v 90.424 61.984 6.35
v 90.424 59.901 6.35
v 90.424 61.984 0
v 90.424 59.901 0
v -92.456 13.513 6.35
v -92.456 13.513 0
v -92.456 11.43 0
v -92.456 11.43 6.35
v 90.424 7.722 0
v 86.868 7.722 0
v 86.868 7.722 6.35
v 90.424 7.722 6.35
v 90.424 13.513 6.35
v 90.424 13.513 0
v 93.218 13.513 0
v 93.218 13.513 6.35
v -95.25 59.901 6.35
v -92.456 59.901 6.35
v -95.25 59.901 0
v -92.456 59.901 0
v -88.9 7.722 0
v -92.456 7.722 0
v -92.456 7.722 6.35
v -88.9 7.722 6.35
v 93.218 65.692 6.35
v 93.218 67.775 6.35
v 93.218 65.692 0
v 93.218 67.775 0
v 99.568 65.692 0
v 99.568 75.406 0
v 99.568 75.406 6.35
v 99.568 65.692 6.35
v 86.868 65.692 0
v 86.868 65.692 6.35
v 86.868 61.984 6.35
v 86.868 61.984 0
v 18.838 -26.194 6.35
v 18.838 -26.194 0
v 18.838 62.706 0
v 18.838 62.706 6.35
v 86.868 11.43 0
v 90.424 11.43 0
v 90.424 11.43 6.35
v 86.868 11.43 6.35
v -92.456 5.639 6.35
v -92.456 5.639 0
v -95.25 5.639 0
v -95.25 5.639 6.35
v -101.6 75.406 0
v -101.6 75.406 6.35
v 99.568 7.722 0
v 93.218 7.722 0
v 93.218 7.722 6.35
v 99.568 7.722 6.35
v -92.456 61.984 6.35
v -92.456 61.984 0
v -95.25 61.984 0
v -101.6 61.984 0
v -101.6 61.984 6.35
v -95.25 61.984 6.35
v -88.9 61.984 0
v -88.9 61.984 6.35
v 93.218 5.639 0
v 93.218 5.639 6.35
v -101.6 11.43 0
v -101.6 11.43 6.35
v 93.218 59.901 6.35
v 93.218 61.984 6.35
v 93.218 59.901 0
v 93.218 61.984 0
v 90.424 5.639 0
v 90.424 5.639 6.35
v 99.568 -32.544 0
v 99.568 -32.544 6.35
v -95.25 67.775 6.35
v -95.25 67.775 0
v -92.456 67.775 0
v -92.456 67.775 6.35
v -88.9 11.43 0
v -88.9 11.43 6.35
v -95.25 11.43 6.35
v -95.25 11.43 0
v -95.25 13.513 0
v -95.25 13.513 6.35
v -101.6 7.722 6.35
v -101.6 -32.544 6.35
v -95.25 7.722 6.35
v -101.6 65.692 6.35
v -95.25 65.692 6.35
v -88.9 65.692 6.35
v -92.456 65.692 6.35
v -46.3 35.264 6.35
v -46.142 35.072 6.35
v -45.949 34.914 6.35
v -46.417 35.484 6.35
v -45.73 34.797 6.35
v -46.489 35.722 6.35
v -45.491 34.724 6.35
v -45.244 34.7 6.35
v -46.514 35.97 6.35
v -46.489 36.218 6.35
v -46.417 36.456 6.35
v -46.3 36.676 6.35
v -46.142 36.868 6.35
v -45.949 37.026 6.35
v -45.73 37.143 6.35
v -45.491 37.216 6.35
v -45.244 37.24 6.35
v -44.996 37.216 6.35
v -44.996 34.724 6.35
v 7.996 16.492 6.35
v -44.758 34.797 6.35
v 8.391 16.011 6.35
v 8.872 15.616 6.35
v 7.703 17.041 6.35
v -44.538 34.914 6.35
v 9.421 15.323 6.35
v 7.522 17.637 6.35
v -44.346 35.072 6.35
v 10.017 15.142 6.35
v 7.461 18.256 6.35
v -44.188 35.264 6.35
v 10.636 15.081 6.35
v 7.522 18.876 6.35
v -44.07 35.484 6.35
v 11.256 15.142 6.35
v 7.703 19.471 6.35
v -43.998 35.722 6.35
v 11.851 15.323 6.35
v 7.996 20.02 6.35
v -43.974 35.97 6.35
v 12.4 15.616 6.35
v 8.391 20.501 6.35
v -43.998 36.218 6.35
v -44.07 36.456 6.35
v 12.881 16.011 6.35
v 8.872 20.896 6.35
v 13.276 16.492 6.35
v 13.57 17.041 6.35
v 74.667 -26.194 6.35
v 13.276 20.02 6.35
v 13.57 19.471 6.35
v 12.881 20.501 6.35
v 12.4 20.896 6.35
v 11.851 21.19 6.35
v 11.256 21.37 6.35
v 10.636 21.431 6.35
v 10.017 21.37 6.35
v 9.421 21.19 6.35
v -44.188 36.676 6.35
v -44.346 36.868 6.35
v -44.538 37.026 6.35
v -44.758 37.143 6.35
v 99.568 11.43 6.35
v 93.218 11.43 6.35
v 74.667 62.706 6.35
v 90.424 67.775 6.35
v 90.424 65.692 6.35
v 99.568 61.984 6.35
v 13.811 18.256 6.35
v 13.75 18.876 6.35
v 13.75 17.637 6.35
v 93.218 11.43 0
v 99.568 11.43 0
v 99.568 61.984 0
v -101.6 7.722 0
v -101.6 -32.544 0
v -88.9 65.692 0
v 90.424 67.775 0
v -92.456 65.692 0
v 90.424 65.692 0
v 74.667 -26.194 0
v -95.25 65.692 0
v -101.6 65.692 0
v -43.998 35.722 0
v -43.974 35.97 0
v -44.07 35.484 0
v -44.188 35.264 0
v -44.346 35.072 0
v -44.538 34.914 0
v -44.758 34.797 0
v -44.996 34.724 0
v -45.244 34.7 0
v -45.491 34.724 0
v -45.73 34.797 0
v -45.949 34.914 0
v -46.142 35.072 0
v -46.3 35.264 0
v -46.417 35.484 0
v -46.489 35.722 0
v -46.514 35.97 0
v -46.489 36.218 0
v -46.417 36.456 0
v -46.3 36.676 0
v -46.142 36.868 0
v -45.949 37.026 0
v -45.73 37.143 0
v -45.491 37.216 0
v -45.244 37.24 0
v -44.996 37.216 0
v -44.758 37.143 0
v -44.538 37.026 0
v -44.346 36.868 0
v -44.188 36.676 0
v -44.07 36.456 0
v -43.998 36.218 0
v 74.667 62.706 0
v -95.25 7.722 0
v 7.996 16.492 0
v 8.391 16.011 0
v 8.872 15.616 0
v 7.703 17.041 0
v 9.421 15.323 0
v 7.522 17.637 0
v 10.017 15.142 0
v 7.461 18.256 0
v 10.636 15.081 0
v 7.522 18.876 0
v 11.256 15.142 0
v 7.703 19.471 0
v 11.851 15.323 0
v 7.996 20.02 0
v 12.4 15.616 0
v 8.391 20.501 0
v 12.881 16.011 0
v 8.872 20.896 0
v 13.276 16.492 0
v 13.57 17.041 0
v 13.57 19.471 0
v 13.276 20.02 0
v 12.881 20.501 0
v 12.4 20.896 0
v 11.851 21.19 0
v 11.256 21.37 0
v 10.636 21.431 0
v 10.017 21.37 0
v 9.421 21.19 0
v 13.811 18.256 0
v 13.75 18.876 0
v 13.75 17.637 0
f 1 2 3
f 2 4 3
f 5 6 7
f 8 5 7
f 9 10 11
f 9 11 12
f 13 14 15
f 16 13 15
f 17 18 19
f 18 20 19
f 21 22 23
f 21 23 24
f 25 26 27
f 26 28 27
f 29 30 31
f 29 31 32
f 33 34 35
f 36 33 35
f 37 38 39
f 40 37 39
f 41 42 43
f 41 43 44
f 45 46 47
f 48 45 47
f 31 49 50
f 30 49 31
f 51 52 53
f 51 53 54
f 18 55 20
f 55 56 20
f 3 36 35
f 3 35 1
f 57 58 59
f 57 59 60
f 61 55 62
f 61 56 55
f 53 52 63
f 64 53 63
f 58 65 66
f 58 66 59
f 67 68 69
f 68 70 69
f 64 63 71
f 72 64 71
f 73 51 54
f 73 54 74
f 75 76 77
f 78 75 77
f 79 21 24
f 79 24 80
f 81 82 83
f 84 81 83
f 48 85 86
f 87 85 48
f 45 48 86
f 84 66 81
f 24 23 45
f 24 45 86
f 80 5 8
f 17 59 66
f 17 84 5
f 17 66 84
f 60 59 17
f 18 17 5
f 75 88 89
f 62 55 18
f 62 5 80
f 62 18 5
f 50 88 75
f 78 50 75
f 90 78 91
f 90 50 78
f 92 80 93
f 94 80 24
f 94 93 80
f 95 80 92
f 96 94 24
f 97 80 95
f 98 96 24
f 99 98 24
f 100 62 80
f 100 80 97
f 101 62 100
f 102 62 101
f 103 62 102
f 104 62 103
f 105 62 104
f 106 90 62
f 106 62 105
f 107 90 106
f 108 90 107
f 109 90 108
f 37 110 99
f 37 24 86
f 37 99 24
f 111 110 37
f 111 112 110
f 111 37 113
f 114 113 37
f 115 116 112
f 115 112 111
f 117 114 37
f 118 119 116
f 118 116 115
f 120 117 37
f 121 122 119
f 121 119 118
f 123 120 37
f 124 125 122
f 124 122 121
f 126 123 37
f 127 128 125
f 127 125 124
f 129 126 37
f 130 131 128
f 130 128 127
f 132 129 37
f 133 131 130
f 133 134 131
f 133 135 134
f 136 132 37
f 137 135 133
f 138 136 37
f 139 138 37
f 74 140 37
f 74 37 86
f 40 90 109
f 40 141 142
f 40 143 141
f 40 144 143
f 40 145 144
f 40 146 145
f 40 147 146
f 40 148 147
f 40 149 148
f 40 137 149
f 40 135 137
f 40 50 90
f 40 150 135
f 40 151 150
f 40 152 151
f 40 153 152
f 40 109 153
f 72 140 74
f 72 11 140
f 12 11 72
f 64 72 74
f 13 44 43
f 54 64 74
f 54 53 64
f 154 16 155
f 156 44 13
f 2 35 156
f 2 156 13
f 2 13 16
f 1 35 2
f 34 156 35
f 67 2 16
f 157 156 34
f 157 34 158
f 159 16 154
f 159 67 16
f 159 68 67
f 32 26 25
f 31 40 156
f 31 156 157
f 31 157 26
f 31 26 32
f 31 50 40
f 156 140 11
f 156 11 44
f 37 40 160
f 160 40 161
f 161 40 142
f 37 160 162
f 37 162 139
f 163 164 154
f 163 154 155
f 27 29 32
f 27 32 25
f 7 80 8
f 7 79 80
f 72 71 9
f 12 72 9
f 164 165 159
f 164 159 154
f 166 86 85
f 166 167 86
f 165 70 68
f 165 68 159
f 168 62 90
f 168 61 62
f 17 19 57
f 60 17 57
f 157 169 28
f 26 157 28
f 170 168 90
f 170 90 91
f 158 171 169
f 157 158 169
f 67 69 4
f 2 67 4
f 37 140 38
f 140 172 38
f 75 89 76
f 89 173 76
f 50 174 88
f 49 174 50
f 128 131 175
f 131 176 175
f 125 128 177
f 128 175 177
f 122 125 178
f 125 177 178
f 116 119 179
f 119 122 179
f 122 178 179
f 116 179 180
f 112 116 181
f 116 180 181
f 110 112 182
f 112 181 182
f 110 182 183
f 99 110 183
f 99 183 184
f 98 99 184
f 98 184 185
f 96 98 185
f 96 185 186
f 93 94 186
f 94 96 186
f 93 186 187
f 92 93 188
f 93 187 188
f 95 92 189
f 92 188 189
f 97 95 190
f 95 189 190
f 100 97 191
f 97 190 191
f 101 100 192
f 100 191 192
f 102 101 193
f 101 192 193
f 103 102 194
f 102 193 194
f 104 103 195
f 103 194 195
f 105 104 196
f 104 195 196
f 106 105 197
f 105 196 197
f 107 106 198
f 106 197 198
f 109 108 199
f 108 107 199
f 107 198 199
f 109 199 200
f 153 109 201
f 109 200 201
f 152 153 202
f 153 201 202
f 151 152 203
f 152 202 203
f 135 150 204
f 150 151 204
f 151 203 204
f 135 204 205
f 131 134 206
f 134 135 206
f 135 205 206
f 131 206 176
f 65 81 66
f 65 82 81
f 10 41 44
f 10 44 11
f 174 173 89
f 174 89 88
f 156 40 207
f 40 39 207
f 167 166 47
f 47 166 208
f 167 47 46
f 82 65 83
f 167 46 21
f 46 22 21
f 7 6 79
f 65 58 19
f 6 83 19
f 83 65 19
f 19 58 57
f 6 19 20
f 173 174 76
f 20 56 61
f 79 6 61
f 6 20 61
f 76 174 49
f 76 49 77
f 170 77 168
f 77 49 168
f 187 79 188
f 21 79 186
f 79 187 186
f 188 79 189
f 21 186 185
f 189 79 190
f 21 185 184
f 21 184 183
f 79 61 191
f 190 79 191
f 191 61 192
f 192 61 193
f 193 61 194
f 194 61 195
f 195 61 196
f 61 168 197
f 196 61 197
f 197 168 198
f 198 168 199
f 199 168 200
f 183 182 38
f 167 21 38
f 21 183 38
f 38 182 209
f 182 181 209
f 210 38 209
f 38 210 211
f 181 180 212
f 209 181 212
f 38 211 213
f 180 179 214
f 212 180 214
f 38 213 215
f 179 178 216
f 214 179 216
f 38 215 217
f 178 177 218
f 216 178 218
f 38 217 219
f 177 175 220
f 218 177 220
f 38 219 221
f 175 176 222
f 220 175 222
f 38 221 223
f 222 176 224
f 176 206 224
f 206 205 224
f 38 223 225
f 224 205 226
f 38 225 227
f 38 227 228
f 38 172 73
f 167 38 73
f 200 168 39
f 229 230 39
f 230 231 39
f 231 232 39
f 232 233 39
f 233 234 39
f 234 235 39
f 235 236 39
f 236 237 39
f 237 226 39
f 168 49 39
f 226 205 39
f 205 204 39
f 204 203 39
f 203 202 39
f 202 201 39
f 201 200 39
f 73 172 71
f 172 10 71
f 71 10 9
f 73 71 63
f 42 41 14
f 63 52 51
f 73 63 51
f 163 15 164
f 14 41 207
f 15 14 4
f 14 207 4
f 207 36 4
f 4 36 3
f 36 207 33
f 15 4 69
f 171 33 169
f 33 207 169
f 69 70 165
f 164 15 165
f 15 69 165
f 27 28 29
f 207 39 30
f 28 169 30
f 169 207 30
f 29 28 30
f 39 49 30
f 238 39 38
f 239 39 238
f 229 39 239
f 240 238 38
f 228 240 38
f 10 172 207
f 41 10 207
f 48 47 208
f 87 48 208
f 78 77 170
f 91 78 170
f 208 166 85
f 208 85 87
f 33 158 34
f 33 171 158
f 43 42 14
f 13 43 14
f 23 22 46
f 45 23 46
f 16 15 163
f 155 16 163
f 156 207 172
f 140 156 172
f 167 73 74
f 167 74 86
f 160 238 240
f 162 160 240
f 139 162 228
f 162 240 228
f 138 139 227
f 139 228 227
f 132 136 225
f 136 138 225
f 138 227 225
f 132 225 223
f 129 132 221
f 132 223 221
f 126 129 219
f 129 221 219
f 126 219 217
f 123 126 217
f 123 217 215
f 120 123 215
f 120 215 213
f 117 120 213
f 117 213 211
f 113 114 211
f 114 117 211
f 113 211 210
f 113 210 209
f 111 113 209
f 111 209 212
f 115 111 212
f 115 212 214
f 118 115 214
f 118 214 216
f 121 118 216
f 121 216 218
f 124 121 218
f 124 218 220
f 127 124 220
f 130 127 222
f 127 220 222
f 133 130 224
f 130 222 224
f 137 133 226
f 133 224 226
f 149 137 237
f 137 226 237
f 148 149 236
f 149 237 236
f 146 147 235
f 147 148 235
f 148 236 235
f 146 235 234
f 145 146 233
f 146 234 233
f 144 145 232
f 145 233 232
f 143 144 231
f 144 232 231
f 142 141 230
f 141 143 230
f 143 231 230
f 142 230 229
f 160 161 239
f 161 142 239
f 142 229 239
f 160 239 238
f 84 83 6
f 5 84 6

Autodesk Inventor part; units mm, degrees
ref_plane "YZ Plane" through (0, 0, 0) normal (1, 0, 0) x (0, 1, 0)
ref_plane "XZ Plane" through (0, 0, 0) normal (0, 1, 0) x (-1, 0, 0)
ref_plane "XY Plane" through (0, 0, 0) normal (0, 0, 1) x (1, 0, 0)
sketch "Sketch1" plane through (0, 0, 0) normal (0, 0, 1) x (1, 0, 0)
  circle A0 centre (-45.2437, 35.97) radius 1.27
  circle A1 centre (10.6363, 18.2563) radius 3.175
  line L0 (-71.7503, -2.6941) -> (-71.7503, 45.5566)
  line L1 (69.7183, -2.6941) -> (-71.7503, -2.6941)
  line L2 (69.7183, 45.5566) -> (69.7183, -2.6941)
  line L3 (-71.7503, 45.5566) -> (69.7183, 45.5566)
  line L4 (99.568, 75.4063) -> (99.568, -32.5437)
  line L5 (99.568, -32.5437) -> (-101.6, -32.5438)
  line L6 (-101.6, -32.5438) -> (-101.6, 75.4062)
  line L7 (-101.6, 75.4062) -> (99.568, 75.4063)
  line L8 (18.8383, 62.7063) -> (74.667, 62.7063)
  line L9 (74.667, 62.7063) -> (74.667, -26.1937)
  line L10 (74.667, -26.1937) -> (18.8383, -26.1937)
  line L11 (18.8383, -26.1937) -> (18.8383, 62.7063)
  line L12 (99.568, 21.4313) -> (-101.6, 21.4312) construction
  line L13 (8.6043, 3.175) -> (8.6043, 21.4313) construction
  point P0 (0, 0)
  dimension "d2" = 201.168
  dimension "d3" = 107.95
  dimension "d4" = 107.95
  dimension "d5" = 90
  dimension "d6" = 201.168
  dimension "d7" = 12.7
  dimension "d8" = 88.9
extrude "Extrusion1" add sketch "Sketch1" along normal blind 6.35 contours L0 L3 L11 L1 | L4 L5 L6 L7
sketch "Sketch2" plane through (0, 0, 0) normal (0, 0, -1) x (-1, 0, 0)
  line L0 (101.6, -32.5438) -> (101.6, 75.4062) projected
  line L1 (107.95, 65.692) -> (107.95, 61.9836) projected
  line L2 (107.95, 11.4304) -> (107.95, 7.722) projected
  line L3 (101.6, 7.722) -> (107.95, 7.722) construction
  line L4 (101.6, 11.4304) -> (107.95, 11.4304) construction
  line L5 (101.6, 61.9836) -> (107.95, 61.9836) construction
  line L6 (101.6, 65.4439) -> (107.95, 65.4439) construction
  line L7 (101.6, 7.722) -> (88.9, 7.722)
  line L8 (88.9, 7.722) -> (88.9, 11.4304)
  line L9 (88.9, 11.4304) -> (101.6, 11.4304)
  line L10 (101.6, 11.4304) -> (101.6, 7.722)
  line L11 (101.6, 61.9836) -> (88.9, 61.9836)
  line L12 (88.9, 61.9836) -> (88.9, 65.692)
  line L13 (88.9, 65.692) -> (101.6, 65.692)
  line L14 (101.6, 65.692) -> (101.6, 61.9836)
  line L15 (92.456, 5.6392) -> (95.25, 5.6392)
  line L16 (95.25, 5.6392) -> (95.25, 13.5132)
  line L17 (95.25, 13.5132) -> (92.456, 13.5132)
  line L18 (92.456, 13.5132) -> (92.456, 5.6392)
  line L19 (92.456, 59.9008) -> (95.25, 59.9008)
  line L20 (95.25, 59.9008) -> (95.25, 67.7748)
  line L21 (95.25, 67.7748) -> (92.456, 67.7748)
  line L22 (92.456, 67.7748) -> (92.456, 59.9008)
  point P0 (0, 0)
  dimension "d9" = 12.7
  dimension "d10" = 2.794
  dimension "d11" = 7.874
  dimension "d12" = 7.874
  dimension "d13" = 2.794
  dimension "d14" = 2.0828
  dimension "d16" = 2.0828
  dimension "d17" = 2.0828
  dimension "d18" = 6.35
  dimension "d19" = 6.35
extrude "Extrusion2" cut sketch "Sketch2" against normal through all
ref_plane "Work Plane1" through (-1.016, -32.5437, 0) normal (-1, 0, 0) x (0, 0, 1)
mirror "Mirror1" about plane through (-1.016, -32.5437, 0) normal (-1, 0, 0) of "Extrusion2"
equation "\"d4\" = d3"
equation "\"d6\" = d2"
equation "\"d13\" = d10"
equation "\"d14\" = d16"
equation "\"d17\" = d14"
equation "\"d19\" = d18"
properties part number "projectorMountingBase" material "Steel, Wrought"
